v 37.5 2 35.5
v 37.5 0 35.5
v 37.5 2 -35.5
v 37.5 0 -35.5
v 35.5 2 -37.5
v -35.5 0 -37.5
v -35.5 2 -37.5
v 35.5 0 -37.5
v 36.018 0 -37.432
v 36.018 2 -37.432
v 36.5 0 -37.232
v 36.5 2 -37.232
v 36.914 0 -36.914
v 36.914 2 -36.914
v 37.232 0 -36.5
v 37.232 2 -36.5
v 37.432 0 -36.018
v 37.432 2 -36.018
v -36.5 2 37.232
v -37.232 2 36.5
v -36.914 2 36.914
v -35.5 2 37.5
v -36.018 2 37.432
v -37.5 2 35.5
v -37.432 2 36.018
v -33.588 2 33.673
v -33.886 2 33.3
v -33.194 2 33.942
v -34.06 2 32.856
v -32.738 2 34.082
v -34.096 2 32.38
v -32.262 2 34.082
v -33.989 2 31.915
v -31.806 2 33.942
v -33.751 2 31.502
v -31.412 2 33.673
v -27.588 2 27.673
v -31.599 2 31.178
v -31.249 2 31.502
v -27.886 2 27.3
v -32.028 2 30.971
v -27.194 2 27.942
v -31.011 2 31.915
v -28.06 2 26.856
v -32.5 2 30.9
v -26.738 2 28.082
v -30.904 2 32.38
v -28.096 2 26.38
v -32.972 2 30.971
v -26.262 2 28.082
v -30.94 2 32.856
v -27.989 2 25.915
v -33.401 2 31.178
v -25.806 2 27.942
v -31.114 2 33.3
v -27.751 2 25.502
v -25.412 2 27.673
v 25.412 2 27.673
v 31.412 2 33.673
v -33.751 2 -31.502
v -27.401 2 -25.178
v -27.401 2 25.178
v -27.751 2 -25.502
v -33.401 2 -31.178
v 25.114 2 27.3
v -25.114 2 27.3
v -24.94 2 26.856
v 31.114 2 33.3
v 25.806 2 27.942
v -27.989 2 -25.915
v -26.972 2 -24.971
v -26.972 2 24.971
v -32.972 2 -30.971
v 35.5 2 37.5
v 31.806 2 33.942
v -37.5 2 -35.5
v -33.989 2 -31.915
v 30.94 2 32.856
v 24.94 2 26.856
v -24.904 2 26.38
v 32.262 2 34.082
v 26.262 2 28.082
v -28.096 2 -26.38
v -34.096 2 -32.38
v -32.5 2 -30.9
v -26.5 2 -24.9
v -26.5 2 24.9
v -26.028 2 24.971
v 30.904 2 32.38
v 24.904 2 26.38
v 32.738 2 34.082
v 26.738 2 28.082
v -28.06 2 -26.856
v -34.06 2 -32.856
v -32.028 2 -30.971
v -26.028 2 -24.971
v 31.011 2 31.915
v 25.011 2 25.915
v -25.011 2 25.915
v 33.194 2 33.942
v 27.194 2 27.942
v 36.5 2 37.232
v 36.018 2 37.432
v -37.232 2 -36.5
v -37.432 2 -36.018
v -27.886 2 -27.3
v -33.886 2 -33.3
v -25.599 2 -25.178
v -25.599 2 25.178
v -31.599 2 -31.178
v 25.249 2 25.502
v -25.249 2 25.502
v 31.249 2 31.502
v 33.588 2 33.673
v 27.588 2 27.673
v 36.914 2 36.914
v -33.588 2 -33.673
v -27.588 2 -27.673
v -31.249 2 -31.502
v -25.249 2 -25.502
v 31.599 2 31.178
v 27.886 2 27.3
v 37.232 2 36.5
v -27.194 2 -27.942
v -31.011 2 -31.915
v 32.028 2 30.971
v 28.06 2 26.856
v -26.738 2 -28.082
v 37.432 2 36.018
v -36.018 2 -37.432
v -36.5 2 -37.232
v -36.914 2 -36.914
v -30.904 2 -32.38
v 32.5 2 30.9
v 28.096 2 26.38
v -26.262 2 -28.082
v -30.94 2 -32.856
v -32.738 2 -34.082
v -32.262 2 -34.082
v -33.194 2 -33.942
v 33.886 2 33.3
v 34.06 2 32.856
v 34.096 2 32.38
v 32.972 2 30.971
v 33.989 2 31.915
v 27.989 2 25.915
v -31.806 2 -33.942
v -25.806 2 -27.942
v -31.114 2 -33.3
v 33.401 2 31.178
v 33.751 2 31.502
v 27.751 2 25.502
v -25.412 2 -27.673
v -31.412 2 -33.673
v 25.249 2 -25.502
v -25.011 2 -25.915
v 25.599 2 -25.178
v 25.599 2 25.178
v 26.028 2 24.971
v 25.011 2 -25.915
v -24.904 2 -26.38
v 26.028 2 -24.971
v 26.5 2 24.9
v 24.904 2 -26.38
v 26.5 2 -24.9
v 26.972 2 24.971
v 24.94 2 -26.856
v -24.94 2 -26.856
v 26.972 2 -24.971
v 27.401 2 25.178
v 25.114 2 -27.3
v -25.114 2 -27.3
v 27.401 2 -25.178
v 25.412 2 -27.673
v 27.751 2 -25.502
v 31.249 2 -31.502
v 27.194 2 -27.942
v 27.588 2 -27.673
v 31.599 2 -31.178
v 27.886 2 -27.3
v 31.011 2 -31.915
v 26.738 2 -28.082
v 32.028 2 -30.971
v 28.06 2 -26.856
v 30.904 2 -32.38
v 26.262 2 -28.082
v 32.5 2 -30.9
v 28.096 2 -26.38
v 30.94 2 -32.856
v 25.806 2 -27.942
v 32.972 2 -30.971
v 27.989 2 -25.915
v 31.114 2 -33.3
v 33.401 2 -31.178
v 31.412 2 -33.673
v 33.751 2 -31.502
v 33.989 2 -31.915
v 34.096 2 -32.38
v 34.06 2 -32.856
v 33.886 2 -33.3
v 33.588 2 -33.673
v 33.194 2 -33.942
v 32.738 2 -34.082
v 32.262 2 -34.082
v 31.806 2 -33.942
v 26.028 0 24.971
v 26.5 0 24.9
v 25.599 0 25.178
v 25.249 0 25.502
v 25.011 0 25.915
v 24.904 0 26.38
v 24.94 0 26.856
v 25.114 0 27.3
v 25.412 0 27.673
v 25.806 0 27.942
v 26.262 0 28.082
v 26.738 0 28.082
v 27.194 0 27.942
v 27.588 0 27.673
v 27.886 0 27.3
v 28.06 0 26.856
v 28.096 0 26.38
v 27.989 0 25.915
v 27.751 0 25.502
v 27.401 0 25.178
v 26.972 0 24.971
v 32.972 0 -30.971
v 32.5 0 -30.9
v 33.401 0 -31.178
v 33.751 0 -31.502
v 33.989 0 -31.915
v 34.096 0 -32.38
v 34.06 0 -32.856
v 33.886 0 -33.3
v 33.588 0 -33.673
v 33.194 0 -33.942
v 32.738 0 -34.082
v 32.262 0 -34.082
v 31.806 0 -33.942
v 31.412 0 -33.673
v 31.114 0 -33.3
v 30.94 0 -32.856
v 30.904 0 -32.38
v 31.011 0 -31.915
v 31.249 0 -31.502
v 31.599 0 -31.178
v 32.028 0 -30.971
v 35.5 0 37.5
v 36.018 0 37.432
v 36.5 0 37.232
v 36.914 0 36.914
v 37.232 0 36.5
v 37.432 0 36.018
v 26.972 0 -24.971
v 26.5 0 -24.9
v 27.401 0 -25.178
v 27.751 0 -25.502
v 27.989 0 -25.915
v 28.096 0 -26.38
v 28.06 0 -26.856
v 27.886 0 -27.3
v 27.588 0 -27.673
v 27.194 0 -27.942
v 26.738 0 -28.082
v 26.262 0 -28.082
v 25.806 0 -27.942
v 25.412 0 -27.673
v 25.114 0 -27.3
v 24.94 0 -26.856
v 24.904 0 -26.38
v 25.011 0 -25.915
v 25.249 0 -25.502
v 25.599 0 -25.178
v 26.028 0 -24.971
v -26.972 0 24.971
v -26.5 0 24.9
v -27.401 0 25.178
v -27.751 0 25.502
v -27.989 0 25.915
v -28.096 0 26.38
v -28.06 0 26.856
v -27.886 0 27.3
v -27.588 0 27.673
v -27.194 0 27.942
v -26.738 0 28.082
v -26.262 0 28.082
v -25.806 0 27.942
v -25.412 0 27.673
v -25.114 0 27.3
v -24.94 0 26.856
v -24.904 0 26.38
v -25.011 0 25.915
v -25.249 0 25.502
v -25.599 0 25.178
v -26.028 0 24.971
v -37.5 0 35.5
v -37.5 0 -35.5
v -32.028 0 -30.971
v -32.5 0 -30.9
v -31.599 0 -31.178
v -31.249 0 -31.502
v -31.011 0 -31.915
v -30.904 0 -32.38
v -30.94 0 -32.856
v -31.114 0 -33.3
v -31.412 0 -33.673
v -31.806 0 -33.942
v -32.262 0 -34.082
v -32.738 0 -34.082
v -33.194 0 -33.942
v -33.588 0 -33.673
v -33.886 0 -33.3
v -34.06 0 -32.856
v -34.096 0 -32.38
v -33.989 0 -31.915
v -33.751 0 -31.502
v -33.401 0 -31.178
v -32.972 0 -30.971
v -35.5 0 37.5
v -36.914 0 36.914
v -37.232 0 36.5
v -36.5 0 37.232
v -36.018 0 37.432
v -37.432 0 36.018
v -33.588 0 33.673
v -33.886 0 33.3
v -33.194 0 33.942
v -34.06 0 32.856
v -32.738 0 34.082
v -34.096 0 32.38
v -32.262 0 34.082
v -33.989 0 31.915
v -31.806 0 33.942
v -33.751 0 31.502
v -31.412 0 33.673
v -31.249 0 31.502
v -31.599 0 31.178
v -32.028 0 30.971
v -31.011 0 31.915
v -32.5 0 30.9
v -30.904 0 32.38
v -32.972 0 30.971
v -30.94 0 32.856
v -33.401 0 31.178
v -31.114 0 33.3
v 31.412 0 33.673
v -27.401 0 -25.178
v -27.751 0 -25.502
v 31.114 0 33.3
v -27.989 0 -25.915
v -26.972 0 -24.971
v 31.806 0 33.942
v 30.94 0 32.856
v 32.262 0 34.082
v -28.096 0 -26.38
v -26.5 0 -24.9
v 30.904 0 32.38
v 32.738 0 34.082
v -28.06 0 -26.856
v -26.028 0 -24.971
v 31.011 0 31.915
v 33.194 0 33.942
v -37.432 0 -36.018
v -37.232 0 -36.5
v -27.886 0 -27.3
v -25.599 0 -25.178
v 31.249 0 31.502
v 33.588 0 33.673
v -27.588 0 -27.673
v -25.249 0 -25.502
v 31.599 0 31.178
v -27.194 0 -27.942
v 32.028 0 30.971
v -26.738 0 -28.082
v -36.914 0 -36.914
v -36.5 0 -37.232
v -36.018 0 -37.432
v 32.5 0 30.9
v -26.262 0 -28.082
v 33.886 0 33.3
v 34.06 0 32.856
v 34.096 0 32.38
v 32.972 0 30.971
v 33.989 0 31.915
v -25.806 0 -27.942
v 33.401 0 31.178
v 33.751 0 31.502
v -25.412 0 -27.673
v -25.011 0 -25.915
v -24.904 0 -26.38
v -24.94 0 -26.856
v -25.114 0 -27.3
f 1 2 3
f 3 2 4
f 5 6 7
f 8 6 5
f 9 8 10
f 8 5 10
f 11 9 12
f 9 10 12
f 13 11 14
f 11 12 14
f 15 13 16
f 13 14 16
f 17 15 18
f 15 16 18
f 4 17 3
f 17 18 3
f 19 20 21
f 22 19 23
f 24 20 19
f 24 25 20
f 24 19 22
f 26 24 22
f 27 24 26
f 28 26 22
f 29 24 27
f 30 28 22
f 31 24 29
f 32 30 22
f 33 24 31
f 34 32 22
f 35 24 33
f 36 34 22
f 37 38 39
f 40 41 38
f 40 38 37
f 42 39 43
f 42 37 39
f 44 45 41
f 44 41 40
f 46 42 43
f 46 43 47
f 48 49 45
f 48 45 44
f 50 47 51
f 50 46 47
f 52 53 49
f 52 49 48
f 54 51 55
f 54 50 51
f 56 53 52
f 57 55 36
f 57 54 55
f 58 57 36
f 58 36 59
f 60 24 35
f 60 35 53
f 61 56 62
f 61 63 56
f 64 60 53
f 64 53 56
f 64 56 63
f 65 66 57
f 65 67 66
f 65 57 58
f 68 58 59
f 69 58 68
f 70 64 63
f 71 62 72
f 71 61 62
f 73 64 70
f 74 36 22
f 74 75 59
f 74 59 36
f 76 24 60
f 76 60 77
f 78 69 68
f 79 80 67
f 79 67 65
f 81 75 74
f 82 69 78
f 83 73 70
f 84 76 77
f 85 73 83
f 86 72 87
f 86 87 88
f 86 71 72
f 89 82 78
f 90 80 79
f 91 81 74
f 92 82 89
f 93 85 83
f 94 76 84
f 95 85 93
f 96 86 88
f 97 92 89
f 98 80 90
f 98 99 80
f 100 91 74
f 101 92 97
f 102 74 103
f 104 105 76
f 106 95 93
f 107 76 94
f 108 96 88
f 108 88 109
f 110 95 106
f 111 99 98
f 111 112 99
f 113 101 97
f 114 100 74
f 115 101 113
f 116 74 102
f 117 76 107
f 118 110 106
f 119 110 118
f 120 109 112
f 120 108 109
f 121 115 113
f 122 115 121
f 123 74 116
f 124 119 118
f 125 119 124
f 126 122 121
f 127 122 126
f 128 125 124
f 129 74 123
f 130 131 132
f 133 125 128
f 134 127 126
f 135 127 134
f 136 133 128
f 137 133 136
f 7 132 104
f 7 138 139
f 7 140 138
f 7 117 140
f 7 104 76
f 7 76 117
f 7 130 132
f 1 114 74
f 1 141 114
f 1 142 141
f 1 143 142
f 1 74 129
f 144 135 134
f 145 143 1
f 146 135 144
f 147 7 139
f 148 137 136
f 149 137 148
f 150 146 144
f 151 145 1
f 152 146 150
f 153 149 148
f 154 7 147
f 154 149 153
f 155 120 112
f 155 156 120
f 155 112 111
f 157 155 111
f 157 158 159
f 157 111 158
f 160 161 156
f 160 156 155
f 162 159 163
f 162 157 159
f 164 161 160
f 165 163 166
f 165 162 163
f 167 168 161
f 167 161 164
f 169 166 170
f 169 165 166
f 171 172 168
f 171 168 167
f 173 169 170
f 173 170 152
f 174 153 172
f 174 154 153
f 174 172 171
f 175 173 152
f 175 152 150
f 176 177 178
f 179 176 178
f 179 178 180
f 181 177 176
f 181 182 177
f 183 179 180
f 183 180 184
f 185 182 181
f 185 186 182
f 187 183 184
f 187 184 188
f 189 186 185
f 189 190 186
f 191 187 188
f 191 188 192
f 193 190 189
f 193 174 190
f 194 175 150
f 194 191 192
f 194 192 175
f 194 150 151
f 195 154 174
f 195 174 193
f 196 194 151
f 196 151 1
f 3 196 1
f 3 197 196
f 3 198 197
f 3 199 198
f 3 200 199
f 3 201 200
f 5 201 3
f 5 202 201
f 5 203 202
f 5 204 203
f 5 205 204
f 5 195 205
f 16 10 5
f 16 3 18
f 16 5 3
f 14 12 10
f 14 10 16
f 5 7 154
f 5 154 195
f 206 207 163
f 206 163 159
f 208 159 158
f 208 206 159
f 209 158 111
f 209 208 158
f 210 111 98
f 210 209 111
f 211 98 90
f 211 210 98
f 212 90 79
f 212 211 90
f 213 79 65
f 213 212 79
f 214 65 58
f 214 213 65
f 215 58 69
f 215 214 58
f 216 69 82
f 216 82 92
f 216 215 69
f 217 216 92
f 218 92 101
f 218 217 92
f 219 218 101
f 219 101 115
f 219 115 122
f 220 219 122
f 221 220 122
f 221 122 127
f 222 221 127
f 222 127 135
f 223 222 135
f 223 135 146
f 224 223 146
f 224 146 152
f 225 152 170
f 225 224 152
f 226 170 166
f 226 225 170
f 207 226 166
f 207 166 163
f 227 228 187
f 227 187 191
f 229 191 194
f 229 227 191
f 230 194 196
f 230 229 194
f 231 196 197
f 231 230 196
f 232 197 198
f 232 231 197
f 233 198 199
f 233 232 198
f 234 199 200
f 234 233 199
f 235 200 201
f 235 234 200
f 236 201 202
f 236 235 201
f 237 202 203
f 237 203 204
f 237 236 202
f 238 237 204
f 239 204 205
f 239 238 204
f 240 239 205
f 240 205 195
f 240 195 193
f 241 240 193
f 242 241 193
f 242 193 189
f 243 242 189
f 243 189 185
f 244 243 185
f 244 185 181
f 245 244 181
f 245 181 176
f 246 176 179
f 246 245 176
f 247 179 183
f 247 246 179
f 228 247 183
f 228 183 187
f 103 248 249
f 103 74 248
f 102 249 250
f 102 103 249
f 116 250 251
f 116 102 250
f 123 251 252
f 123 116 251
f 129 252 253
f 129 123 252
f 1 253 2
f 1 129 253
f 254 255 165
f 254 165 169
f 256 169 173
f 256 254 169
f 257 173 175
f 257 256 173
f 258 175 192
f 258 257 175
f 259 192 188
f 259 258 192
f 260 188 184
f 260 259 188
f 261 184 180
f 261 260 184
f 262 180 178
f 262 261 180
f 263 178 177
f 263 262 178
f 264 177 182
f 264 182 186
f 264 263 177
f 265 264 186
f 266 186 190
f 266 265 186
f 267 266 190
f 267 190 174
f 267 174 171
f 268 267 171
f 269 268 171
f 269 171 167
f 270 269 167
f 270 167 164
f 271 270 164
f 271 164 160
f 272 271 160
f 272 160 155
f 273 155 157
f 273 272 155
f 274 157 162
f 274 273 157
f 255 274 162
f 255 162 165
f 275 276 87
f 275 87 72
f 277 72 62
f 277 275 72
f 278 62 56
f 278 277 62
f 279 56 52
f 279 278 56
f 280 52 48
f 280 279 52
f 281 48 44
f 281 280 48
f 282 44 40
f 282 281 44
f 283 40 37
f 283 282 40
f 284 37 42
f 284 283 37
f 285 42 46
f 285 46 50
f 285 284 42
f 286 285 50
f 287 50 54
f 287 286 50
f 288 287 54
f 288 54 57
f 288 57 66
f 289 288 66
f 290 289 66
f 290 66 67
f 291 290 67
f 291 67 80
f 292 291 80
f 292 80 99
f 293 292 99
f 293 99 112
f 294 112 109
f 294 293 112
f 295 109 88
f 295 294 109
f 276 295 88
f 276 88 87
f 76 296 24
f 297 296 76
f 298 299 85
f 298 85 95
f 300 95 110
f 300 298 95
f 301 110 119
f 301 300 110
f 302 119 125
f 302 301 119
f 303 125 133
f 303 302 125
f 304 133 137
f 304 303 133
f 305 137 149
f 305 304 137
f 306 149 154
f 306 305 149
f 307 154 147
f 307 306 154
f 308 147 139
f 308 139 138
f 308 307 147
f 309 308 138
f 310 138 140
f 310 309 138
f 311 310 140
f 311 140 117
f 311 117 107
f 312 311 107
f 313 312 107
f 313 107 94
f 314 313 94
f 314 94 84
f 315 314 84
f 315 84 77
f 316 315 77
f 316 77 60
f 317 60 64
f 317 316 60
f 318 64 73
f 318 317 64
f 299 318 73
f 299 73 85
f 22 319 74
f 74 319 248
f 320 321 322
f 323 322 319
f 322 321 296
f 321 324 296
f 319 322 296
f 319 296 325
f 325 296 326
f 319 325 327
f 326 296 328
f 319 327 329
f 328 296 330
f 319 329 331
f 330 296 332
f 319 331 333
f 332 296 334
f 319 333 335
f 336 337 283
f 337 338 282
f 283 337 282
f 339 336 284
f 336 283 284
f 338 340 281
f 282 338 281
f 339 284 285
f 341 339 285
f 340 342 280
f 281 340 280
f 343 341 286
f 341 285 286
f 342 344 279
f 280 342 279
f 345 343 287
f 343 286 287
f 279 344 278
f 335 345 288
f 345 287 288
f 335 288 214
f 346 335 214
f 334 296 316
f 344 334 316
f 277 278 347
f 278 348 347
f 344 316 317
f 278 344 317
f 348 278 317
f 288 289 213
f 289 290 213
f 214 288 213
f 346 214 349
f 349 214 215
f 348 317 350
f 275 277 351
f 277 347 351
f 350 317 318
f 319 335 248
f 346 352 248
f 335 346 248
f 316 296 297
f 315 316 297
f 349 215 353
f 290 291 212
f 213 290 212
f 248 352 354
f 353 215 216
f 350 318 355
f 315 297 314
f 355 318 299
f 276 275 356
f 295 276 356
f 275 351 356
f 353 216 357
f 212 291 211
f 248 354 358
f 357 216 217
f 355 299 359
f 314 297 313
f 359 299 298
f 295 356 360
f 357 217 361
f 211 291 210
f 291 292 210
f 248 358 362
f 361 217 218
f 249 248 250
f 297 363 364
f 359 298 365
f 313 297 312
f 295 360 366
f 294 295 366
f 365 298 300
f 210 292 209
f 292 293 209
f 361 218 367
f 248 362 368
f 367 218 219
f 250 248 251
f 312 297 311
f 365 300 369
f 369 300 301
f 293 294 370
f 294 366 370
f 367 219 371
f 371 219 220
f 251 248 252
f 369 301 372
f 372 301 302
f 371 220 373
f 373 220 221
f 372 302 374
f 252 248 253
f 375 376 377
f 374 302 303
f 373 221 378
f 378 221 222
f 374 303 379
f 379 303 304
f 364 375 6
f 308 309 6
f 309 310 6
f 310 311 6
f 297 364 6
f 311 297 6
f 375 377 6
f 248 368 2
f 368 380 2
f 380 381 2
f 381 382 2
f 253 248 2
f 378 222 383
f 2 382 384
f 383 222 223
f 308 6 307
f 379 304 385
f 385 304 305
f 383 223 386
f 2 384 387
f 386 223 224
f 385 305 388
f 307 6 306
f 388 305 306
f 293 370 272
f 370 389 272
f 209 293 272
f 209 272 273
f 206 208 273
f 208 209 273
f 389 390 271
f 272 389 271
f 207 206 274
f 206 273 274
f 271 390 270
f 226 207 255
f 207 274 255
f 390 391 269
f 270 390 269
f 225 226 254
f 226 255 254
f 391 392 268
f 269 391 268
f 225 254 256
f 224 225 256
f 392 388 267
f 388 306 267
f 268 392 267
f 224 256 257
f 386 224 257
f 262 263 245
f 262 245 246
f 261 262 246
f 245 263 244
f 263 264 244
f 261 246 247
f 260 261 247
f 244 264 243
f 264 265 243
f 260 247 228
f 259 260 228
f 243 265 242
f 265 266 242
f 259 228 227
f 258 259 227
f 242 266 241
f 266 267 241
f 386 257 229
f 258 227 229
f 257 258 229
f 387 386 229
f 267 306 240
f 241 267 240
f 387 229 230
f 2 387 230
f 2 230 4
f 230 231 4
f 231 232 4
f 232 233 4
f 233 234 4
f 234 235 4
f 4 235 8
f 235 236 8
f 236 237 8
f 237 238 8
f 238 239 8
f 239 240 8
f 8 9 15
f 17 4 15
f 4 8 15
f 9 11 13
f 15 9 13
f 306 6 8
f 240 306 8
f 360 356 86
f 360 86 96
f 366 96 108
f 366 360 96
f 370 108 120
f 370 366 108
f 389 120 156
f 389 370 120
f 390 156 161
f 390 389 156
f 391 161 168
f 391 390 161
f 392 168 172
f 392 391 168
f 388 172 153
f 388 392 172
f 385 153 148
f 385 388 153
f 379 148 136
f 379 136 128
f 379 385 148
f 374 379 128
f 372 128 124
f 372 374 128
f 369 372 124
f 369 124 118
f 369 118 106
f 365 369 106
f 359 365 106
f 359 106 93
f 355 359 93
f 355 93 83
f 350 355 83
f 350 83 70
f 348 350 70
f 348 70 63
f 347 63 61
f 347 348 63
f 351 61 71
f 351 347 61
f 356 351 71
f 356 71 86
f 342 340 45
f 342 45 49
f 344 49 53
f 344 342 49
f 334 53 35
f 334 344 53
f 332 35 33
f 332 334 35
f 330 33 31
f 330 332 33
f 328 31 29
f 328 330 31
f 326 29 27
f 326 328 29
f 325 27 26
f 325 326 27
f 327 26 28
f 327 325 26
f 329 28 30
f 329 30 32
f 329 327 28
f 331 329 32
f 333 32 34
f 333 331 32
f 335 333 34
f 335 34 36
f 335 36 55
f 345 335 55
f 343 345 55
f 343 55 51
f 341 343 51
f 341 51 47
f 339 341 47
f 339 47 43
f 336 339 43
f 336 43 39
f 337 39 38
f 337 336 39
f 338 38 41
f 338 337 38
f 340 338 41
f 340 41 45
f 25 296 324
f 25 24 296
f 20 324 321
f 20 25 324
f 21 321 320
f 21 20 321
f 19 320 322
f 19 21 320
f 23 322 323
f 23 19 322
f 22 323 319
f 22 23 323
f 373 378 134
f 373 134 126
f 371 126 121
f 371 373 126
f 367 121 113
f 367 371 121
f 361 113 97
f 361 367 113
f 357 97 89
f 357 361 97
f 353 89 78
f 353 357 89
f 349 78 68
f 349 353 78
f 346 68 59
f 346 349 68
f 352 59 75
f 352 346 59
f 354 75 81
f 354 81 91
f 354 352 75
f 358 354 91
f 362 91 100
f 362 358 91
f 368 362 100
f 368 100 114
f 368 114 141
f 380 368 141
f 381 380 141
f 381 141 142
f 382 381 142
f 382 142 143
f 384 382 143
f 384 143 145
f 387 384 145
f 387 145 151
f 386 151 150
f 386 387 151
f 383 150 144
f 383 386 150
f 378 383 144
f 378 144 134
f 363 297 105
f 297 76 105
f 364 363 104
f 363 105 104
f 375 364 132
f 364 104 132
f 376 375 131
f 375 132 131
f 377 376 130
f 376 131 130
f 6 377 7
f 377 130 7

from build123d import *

# Parameters (mm, degrees)
SKETCH_1_W      = 75
SKETCH_1_H      = 75
SKETCH_1_R      = 1.6
EXTRUDE_1_DEPTH = 2
FILLET_1_R      = 2


with BuildPart() as part:
    # 草图1 → 凸台-拉伸1 (new body)
    with BuildSketch(Plane(origin=(0, 0, 0), x_dir=(1, 0, 0), z_dir=(0, 1, 0))):
        Rectangle(SKETCH_1_W, SKETCH_1_H)
        with Locations(Location((-26.5, 26.5, 0), (0, 0, 270))):
            Circle(SKETCH_1_R, mode=Mode.SUBTRACT)
        with Locations(Location((26.5, 26.5, 0), (0, 0, 270))):
            Circle(SKETCH_1_R, mode=Mode.SUBTRACT)
        with Locations(Location((26.5, -26.5, 0), (0, 0, 90))):
            Circle(SKETCH_1_R, mode=Mode.SUBTRACT)
        with Locations(Location((-26.5, -26.5, 0), (0, 0, 90))):
            Circle(SKETCH_1_R, mode=Mode.SUBTRACT)
        with Locations(Location((-32.5, 32.5, 0), (0, 0, 270))):
            Circle(SKETCH_1_R, mode=Mode.SUBTRACT)
        with Locations(Location((32.5, 32.5, 0), (0, 0, 270))):
            Circle(SKETCH_1_R, mode=Mode.SUBTRACT)
        with Locations(Location((32.5, -32.5, 0), (0, 0, 90))):
            Circle(SKETCH_1_R, mode=Mode.SUBTRACT)
        with Locations(Location((-32.5, -32.5, 0), (0, 0, 90))):
            Circle(SKETCH_1_R, mode=Mode.SUBTRACT)
    extrude(amount=EXTRUDE_1_DEPTH)

    # 圆角1
    fillet_1_edges = [part.edges().sort_by_distance(p)[0] for p in [
        (37.5, 1, 37.5),
        (-37.5, 1, 37.5),
        (-37.5, 1, -37.5),
        (37.5, 1, -37.5),
    ]]
    fillet(fillet_1_edges, radius=FILLET_1_R)


solid = part.part
